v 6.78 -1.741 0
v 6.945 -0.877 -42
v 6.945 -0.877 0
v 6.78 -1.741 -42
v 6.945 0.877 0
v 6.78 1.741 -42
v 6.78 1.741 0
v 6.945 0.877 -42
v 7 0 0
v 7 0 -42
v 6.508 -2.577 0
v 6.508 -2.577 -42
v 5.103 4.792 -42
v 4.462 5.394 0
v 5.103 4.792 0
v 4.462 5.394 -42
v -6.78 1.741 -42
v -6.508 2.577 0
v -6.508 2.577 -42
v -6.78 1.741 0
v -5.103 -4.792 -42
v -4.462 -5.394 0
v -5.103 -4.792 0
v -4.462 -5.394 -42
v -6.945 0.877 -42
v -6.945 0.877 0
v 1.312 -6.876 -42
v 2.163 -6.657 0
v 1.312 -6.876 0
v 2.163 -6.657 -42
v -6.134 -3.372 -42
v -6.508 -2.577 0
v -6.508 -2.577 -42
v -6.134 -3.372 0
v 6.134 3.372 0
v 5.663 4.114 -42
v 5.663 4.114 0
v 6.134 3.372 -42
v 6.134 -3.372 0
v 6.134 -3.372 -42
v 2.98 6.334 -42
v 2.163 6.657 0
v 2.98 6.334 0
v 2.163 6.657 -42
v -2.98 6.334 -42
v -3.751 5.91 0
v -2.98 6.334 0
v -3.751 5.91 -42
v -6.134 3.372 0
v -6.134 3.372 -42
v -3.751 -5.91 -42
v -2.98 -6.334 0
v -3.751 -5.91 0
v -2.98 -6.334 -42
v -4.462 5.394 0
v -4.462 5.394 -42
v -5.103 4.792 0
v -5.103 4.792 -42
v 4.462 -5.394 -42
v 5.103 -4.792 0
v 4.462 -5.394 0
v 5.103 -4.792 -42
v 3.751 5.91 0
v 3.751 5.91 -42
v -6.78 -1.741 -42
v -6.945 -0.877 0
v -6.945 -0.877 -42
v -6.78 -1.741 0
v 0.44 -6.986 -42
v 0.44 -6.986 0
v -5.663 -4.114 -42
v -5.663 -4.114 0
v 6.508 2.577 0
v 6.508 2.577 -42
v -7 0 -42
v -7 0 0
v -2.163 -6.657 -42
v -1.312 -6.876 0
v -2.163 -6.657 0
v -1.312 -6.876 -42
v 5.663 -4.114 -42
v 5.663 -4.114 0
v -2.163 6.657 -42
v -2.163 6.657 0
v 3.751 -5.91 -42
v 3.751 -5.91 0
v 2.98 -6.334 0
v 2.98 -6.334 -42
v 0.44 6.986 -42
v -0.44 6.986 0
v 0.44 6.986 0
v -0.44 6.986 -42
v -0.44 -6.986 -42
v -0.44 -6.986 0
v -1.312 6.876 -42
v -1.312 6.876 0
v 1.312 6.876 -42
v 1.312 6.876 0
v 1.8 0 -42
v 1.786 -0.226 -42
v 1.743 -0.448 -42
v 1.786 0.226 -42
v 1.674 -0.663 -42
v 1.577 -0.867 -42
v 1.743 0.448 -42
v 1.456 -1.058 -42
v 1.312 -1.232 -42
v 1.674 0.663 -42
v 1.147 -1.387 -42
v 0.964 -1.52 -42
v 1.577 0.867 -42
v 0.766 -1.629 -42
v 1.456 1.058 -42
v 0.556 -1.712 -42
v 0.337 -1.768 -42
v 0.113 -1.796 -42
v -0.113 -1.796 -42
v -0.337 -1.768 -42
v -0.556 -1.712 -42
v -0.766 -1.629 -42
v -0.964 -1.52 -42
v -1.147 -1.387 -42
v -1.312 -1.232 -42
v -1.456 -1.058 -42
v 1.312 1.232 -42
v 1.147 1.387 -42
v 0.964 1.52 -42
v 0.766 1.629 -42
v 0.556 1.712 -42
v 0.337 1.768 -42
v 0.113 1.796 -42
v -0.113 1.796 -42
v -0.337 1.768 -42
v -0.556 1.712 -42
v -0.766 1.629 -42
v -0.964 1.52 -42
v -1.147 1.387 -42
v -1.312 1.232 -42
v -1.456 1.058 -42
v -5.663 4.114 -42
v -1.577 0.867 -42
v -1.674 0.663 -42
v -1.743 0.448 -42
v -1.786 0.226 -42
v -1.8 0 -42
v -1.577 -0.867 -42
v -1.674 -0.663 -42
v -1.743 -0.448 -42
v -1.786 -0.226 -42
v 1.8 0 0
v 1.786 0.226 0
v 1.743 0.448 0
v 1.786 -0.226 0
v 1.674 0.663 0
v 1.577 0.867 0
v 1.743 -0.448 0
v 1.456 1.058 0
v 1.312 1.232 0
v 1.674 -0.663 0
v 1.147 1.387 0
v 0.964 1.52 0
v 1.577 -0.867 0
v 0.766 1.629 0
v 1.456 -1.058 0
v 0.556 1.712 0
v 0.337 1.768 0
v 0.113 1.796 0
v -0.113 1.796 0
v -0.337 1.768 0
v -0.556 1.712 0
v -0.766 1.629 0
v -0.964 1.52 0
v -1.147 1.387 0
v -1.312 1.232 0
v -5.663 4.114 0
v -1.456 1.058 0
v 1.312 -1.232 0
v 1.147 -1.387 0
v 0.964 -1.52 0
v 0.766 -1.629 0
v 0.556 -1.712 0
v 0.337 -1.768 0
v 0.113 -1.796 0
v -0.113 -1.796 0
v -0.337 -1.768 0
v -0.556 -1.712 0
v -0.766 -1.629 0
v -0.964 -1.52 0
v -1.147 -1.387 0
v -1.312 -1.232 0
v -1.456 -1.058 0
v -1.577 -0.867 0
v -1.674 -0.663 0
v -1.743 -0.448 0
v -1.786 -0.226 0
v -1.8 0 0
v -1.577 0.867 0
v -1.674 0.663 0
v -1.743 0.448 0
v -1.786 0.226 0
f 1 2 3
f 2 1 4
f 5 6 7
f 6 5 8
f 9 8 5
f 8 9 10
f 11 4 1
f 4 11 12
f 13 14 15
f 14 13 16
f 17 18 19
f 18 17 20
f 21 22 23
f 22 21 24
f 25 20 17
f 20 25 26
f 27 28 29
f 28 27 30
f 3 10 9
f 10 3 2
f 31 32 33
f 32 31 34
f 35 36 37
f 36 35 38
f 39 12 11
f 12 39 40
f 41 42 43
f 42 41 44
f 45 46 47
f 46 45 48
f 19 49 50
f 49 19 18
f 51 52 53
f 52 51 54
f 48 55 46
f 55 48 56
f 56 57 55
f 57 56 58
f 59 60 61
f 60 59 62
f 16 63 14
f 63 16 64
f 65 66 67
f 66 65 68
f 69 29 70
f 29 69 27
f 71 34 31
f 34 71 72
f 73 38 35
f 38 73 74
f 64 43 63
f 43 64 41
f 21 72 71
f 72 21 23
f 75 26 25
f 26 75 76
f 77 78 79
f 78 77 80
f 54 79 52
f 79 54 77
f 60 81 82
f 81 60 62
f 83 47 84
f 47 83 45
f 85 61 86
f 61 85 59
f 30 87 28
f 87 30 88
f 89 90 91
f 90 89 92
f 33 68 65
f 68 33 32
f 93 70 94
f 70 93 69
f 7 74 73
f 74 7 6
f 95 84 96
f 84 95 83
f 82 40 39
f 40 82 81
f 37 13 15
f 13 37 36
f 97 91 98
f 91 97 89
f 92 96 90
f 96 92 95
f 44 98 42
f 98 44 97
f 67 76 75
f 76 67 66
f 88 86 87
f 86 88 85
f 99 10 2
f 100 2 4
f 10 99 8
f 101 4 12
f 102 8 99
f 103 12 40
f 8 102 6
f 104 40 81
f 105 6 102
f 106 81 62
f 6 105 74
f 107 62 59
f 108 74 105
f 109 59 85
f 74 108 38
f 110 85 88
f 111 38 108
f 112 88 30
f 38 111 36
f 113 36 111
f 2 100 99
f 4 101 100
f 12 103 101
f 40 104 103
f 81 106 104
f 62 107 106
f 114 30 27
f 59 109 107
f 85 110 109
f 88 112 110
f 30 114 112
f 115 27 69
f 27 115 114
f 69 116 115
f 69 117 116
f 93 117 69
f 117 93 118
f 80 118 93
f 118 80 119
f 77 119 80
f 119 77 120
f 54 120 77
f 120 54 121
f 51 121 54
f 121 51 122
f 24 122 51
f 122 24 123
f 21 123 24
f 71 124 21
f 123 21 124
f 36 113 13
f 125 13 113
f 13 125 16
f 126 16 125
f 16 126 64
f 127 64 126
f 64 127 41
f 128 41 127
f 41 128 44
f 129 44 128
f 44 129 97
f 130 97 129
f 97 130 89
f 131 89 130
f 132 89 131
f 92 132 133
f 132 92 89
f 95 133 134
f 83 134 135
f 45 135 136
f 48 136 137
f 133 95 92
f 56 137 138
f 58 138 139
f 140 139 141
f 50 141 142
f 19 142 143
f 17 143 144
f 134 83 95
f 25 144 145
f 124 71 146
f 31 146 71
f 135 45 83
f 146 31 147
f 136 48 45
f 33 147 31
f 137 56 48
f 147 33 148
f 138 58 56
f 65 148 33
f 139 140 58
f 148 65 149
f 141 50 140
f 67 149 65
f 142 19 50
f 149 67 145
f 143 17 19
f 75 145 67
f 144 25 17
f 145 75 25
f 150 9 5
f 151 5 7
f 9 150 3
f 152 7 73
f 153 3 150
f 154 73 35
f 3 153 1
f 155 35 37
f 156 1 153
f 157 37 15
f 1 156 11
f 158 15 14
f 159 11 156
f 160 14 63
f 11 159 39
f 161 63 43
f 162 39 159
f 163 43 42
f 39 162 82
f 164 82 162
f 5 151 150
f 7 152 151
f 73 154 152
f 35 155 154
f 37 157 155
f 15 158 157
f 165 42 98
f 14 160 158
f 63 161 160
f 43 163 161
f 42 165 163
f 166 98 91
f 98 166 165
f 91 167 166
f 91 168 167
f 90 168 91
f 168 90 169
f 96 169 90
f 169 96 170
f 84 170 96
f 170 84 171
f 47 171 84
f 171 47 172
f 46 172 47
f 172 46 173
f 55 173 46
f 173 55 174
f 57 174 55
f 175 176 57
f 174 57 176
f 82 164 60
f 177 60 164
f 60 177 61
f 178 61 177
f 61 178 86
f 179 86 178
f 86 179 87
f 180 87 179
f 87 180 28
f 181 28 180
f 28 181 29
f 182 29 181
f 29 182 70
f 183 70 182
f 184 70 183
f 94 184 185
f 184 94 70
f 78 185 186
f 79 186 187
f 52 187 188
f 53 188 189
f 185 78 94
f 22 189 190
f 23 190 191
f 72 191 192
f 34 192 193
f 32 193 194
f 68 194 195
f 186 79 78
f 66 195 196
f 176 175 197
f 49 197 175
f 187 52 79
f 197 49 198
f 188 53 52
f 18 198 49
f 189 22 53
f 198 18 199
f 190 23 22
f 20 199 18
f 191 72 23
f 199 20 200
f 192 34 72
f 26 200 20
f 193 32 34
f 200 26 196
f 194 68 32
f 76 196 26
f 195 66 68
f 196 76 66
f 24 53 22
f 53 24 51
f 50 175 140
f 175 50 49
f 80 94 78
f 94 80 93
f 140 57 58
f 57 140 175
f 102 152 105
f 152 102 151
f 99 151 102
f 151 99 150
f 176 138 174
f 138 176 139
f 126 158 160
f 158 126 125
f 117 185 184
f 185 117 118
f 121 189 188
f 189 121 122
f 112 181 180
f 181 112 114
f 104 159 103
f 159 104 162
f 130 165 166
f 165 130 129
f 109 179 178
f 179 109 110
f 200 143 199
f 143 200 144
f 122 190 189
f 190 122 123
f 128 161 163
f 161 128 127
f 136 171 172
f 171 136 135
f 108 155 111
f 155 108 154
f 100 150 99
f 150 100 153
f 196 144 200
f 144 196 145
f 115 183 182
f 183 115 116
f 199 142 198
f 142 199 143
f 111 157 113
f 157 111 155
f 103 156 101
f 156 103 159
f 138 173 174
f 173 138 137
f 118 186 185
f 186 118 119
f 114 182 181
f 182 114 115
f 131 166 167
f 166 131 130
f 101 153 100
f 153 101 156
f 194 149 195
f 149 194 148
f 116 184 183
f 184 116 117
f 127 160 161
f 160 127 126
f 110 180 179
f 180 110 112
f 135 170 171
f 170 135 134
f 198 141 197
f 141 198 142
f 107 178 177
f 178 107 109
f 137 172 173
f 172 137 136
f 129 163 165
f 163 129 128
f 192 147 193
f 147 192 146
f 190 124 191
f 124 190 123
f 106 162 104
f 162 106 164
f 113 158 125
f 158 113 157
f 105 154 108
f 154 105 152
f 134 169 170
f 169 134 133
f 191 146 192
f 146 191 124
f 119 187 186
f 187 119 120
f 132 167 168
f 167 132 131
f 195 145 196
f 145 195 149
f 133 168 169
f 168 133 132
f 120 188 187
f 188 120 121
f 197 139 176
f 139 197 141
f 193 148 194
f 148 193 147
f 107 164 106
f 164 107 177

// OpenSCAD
$fn = 50;


difference() {
	union() {
		translate(v = [0, 0, -42.0000000000]) {
			cylinder(h = 42, r = 7.0000000000);
		}
		cylinder(h = 0, r = 17.0000000000);
	}
	union() {
		#translate(v = [0, 0, -42]) {
			cylinder(h = 42, r = 1.8000000000);
		}
	}
}
